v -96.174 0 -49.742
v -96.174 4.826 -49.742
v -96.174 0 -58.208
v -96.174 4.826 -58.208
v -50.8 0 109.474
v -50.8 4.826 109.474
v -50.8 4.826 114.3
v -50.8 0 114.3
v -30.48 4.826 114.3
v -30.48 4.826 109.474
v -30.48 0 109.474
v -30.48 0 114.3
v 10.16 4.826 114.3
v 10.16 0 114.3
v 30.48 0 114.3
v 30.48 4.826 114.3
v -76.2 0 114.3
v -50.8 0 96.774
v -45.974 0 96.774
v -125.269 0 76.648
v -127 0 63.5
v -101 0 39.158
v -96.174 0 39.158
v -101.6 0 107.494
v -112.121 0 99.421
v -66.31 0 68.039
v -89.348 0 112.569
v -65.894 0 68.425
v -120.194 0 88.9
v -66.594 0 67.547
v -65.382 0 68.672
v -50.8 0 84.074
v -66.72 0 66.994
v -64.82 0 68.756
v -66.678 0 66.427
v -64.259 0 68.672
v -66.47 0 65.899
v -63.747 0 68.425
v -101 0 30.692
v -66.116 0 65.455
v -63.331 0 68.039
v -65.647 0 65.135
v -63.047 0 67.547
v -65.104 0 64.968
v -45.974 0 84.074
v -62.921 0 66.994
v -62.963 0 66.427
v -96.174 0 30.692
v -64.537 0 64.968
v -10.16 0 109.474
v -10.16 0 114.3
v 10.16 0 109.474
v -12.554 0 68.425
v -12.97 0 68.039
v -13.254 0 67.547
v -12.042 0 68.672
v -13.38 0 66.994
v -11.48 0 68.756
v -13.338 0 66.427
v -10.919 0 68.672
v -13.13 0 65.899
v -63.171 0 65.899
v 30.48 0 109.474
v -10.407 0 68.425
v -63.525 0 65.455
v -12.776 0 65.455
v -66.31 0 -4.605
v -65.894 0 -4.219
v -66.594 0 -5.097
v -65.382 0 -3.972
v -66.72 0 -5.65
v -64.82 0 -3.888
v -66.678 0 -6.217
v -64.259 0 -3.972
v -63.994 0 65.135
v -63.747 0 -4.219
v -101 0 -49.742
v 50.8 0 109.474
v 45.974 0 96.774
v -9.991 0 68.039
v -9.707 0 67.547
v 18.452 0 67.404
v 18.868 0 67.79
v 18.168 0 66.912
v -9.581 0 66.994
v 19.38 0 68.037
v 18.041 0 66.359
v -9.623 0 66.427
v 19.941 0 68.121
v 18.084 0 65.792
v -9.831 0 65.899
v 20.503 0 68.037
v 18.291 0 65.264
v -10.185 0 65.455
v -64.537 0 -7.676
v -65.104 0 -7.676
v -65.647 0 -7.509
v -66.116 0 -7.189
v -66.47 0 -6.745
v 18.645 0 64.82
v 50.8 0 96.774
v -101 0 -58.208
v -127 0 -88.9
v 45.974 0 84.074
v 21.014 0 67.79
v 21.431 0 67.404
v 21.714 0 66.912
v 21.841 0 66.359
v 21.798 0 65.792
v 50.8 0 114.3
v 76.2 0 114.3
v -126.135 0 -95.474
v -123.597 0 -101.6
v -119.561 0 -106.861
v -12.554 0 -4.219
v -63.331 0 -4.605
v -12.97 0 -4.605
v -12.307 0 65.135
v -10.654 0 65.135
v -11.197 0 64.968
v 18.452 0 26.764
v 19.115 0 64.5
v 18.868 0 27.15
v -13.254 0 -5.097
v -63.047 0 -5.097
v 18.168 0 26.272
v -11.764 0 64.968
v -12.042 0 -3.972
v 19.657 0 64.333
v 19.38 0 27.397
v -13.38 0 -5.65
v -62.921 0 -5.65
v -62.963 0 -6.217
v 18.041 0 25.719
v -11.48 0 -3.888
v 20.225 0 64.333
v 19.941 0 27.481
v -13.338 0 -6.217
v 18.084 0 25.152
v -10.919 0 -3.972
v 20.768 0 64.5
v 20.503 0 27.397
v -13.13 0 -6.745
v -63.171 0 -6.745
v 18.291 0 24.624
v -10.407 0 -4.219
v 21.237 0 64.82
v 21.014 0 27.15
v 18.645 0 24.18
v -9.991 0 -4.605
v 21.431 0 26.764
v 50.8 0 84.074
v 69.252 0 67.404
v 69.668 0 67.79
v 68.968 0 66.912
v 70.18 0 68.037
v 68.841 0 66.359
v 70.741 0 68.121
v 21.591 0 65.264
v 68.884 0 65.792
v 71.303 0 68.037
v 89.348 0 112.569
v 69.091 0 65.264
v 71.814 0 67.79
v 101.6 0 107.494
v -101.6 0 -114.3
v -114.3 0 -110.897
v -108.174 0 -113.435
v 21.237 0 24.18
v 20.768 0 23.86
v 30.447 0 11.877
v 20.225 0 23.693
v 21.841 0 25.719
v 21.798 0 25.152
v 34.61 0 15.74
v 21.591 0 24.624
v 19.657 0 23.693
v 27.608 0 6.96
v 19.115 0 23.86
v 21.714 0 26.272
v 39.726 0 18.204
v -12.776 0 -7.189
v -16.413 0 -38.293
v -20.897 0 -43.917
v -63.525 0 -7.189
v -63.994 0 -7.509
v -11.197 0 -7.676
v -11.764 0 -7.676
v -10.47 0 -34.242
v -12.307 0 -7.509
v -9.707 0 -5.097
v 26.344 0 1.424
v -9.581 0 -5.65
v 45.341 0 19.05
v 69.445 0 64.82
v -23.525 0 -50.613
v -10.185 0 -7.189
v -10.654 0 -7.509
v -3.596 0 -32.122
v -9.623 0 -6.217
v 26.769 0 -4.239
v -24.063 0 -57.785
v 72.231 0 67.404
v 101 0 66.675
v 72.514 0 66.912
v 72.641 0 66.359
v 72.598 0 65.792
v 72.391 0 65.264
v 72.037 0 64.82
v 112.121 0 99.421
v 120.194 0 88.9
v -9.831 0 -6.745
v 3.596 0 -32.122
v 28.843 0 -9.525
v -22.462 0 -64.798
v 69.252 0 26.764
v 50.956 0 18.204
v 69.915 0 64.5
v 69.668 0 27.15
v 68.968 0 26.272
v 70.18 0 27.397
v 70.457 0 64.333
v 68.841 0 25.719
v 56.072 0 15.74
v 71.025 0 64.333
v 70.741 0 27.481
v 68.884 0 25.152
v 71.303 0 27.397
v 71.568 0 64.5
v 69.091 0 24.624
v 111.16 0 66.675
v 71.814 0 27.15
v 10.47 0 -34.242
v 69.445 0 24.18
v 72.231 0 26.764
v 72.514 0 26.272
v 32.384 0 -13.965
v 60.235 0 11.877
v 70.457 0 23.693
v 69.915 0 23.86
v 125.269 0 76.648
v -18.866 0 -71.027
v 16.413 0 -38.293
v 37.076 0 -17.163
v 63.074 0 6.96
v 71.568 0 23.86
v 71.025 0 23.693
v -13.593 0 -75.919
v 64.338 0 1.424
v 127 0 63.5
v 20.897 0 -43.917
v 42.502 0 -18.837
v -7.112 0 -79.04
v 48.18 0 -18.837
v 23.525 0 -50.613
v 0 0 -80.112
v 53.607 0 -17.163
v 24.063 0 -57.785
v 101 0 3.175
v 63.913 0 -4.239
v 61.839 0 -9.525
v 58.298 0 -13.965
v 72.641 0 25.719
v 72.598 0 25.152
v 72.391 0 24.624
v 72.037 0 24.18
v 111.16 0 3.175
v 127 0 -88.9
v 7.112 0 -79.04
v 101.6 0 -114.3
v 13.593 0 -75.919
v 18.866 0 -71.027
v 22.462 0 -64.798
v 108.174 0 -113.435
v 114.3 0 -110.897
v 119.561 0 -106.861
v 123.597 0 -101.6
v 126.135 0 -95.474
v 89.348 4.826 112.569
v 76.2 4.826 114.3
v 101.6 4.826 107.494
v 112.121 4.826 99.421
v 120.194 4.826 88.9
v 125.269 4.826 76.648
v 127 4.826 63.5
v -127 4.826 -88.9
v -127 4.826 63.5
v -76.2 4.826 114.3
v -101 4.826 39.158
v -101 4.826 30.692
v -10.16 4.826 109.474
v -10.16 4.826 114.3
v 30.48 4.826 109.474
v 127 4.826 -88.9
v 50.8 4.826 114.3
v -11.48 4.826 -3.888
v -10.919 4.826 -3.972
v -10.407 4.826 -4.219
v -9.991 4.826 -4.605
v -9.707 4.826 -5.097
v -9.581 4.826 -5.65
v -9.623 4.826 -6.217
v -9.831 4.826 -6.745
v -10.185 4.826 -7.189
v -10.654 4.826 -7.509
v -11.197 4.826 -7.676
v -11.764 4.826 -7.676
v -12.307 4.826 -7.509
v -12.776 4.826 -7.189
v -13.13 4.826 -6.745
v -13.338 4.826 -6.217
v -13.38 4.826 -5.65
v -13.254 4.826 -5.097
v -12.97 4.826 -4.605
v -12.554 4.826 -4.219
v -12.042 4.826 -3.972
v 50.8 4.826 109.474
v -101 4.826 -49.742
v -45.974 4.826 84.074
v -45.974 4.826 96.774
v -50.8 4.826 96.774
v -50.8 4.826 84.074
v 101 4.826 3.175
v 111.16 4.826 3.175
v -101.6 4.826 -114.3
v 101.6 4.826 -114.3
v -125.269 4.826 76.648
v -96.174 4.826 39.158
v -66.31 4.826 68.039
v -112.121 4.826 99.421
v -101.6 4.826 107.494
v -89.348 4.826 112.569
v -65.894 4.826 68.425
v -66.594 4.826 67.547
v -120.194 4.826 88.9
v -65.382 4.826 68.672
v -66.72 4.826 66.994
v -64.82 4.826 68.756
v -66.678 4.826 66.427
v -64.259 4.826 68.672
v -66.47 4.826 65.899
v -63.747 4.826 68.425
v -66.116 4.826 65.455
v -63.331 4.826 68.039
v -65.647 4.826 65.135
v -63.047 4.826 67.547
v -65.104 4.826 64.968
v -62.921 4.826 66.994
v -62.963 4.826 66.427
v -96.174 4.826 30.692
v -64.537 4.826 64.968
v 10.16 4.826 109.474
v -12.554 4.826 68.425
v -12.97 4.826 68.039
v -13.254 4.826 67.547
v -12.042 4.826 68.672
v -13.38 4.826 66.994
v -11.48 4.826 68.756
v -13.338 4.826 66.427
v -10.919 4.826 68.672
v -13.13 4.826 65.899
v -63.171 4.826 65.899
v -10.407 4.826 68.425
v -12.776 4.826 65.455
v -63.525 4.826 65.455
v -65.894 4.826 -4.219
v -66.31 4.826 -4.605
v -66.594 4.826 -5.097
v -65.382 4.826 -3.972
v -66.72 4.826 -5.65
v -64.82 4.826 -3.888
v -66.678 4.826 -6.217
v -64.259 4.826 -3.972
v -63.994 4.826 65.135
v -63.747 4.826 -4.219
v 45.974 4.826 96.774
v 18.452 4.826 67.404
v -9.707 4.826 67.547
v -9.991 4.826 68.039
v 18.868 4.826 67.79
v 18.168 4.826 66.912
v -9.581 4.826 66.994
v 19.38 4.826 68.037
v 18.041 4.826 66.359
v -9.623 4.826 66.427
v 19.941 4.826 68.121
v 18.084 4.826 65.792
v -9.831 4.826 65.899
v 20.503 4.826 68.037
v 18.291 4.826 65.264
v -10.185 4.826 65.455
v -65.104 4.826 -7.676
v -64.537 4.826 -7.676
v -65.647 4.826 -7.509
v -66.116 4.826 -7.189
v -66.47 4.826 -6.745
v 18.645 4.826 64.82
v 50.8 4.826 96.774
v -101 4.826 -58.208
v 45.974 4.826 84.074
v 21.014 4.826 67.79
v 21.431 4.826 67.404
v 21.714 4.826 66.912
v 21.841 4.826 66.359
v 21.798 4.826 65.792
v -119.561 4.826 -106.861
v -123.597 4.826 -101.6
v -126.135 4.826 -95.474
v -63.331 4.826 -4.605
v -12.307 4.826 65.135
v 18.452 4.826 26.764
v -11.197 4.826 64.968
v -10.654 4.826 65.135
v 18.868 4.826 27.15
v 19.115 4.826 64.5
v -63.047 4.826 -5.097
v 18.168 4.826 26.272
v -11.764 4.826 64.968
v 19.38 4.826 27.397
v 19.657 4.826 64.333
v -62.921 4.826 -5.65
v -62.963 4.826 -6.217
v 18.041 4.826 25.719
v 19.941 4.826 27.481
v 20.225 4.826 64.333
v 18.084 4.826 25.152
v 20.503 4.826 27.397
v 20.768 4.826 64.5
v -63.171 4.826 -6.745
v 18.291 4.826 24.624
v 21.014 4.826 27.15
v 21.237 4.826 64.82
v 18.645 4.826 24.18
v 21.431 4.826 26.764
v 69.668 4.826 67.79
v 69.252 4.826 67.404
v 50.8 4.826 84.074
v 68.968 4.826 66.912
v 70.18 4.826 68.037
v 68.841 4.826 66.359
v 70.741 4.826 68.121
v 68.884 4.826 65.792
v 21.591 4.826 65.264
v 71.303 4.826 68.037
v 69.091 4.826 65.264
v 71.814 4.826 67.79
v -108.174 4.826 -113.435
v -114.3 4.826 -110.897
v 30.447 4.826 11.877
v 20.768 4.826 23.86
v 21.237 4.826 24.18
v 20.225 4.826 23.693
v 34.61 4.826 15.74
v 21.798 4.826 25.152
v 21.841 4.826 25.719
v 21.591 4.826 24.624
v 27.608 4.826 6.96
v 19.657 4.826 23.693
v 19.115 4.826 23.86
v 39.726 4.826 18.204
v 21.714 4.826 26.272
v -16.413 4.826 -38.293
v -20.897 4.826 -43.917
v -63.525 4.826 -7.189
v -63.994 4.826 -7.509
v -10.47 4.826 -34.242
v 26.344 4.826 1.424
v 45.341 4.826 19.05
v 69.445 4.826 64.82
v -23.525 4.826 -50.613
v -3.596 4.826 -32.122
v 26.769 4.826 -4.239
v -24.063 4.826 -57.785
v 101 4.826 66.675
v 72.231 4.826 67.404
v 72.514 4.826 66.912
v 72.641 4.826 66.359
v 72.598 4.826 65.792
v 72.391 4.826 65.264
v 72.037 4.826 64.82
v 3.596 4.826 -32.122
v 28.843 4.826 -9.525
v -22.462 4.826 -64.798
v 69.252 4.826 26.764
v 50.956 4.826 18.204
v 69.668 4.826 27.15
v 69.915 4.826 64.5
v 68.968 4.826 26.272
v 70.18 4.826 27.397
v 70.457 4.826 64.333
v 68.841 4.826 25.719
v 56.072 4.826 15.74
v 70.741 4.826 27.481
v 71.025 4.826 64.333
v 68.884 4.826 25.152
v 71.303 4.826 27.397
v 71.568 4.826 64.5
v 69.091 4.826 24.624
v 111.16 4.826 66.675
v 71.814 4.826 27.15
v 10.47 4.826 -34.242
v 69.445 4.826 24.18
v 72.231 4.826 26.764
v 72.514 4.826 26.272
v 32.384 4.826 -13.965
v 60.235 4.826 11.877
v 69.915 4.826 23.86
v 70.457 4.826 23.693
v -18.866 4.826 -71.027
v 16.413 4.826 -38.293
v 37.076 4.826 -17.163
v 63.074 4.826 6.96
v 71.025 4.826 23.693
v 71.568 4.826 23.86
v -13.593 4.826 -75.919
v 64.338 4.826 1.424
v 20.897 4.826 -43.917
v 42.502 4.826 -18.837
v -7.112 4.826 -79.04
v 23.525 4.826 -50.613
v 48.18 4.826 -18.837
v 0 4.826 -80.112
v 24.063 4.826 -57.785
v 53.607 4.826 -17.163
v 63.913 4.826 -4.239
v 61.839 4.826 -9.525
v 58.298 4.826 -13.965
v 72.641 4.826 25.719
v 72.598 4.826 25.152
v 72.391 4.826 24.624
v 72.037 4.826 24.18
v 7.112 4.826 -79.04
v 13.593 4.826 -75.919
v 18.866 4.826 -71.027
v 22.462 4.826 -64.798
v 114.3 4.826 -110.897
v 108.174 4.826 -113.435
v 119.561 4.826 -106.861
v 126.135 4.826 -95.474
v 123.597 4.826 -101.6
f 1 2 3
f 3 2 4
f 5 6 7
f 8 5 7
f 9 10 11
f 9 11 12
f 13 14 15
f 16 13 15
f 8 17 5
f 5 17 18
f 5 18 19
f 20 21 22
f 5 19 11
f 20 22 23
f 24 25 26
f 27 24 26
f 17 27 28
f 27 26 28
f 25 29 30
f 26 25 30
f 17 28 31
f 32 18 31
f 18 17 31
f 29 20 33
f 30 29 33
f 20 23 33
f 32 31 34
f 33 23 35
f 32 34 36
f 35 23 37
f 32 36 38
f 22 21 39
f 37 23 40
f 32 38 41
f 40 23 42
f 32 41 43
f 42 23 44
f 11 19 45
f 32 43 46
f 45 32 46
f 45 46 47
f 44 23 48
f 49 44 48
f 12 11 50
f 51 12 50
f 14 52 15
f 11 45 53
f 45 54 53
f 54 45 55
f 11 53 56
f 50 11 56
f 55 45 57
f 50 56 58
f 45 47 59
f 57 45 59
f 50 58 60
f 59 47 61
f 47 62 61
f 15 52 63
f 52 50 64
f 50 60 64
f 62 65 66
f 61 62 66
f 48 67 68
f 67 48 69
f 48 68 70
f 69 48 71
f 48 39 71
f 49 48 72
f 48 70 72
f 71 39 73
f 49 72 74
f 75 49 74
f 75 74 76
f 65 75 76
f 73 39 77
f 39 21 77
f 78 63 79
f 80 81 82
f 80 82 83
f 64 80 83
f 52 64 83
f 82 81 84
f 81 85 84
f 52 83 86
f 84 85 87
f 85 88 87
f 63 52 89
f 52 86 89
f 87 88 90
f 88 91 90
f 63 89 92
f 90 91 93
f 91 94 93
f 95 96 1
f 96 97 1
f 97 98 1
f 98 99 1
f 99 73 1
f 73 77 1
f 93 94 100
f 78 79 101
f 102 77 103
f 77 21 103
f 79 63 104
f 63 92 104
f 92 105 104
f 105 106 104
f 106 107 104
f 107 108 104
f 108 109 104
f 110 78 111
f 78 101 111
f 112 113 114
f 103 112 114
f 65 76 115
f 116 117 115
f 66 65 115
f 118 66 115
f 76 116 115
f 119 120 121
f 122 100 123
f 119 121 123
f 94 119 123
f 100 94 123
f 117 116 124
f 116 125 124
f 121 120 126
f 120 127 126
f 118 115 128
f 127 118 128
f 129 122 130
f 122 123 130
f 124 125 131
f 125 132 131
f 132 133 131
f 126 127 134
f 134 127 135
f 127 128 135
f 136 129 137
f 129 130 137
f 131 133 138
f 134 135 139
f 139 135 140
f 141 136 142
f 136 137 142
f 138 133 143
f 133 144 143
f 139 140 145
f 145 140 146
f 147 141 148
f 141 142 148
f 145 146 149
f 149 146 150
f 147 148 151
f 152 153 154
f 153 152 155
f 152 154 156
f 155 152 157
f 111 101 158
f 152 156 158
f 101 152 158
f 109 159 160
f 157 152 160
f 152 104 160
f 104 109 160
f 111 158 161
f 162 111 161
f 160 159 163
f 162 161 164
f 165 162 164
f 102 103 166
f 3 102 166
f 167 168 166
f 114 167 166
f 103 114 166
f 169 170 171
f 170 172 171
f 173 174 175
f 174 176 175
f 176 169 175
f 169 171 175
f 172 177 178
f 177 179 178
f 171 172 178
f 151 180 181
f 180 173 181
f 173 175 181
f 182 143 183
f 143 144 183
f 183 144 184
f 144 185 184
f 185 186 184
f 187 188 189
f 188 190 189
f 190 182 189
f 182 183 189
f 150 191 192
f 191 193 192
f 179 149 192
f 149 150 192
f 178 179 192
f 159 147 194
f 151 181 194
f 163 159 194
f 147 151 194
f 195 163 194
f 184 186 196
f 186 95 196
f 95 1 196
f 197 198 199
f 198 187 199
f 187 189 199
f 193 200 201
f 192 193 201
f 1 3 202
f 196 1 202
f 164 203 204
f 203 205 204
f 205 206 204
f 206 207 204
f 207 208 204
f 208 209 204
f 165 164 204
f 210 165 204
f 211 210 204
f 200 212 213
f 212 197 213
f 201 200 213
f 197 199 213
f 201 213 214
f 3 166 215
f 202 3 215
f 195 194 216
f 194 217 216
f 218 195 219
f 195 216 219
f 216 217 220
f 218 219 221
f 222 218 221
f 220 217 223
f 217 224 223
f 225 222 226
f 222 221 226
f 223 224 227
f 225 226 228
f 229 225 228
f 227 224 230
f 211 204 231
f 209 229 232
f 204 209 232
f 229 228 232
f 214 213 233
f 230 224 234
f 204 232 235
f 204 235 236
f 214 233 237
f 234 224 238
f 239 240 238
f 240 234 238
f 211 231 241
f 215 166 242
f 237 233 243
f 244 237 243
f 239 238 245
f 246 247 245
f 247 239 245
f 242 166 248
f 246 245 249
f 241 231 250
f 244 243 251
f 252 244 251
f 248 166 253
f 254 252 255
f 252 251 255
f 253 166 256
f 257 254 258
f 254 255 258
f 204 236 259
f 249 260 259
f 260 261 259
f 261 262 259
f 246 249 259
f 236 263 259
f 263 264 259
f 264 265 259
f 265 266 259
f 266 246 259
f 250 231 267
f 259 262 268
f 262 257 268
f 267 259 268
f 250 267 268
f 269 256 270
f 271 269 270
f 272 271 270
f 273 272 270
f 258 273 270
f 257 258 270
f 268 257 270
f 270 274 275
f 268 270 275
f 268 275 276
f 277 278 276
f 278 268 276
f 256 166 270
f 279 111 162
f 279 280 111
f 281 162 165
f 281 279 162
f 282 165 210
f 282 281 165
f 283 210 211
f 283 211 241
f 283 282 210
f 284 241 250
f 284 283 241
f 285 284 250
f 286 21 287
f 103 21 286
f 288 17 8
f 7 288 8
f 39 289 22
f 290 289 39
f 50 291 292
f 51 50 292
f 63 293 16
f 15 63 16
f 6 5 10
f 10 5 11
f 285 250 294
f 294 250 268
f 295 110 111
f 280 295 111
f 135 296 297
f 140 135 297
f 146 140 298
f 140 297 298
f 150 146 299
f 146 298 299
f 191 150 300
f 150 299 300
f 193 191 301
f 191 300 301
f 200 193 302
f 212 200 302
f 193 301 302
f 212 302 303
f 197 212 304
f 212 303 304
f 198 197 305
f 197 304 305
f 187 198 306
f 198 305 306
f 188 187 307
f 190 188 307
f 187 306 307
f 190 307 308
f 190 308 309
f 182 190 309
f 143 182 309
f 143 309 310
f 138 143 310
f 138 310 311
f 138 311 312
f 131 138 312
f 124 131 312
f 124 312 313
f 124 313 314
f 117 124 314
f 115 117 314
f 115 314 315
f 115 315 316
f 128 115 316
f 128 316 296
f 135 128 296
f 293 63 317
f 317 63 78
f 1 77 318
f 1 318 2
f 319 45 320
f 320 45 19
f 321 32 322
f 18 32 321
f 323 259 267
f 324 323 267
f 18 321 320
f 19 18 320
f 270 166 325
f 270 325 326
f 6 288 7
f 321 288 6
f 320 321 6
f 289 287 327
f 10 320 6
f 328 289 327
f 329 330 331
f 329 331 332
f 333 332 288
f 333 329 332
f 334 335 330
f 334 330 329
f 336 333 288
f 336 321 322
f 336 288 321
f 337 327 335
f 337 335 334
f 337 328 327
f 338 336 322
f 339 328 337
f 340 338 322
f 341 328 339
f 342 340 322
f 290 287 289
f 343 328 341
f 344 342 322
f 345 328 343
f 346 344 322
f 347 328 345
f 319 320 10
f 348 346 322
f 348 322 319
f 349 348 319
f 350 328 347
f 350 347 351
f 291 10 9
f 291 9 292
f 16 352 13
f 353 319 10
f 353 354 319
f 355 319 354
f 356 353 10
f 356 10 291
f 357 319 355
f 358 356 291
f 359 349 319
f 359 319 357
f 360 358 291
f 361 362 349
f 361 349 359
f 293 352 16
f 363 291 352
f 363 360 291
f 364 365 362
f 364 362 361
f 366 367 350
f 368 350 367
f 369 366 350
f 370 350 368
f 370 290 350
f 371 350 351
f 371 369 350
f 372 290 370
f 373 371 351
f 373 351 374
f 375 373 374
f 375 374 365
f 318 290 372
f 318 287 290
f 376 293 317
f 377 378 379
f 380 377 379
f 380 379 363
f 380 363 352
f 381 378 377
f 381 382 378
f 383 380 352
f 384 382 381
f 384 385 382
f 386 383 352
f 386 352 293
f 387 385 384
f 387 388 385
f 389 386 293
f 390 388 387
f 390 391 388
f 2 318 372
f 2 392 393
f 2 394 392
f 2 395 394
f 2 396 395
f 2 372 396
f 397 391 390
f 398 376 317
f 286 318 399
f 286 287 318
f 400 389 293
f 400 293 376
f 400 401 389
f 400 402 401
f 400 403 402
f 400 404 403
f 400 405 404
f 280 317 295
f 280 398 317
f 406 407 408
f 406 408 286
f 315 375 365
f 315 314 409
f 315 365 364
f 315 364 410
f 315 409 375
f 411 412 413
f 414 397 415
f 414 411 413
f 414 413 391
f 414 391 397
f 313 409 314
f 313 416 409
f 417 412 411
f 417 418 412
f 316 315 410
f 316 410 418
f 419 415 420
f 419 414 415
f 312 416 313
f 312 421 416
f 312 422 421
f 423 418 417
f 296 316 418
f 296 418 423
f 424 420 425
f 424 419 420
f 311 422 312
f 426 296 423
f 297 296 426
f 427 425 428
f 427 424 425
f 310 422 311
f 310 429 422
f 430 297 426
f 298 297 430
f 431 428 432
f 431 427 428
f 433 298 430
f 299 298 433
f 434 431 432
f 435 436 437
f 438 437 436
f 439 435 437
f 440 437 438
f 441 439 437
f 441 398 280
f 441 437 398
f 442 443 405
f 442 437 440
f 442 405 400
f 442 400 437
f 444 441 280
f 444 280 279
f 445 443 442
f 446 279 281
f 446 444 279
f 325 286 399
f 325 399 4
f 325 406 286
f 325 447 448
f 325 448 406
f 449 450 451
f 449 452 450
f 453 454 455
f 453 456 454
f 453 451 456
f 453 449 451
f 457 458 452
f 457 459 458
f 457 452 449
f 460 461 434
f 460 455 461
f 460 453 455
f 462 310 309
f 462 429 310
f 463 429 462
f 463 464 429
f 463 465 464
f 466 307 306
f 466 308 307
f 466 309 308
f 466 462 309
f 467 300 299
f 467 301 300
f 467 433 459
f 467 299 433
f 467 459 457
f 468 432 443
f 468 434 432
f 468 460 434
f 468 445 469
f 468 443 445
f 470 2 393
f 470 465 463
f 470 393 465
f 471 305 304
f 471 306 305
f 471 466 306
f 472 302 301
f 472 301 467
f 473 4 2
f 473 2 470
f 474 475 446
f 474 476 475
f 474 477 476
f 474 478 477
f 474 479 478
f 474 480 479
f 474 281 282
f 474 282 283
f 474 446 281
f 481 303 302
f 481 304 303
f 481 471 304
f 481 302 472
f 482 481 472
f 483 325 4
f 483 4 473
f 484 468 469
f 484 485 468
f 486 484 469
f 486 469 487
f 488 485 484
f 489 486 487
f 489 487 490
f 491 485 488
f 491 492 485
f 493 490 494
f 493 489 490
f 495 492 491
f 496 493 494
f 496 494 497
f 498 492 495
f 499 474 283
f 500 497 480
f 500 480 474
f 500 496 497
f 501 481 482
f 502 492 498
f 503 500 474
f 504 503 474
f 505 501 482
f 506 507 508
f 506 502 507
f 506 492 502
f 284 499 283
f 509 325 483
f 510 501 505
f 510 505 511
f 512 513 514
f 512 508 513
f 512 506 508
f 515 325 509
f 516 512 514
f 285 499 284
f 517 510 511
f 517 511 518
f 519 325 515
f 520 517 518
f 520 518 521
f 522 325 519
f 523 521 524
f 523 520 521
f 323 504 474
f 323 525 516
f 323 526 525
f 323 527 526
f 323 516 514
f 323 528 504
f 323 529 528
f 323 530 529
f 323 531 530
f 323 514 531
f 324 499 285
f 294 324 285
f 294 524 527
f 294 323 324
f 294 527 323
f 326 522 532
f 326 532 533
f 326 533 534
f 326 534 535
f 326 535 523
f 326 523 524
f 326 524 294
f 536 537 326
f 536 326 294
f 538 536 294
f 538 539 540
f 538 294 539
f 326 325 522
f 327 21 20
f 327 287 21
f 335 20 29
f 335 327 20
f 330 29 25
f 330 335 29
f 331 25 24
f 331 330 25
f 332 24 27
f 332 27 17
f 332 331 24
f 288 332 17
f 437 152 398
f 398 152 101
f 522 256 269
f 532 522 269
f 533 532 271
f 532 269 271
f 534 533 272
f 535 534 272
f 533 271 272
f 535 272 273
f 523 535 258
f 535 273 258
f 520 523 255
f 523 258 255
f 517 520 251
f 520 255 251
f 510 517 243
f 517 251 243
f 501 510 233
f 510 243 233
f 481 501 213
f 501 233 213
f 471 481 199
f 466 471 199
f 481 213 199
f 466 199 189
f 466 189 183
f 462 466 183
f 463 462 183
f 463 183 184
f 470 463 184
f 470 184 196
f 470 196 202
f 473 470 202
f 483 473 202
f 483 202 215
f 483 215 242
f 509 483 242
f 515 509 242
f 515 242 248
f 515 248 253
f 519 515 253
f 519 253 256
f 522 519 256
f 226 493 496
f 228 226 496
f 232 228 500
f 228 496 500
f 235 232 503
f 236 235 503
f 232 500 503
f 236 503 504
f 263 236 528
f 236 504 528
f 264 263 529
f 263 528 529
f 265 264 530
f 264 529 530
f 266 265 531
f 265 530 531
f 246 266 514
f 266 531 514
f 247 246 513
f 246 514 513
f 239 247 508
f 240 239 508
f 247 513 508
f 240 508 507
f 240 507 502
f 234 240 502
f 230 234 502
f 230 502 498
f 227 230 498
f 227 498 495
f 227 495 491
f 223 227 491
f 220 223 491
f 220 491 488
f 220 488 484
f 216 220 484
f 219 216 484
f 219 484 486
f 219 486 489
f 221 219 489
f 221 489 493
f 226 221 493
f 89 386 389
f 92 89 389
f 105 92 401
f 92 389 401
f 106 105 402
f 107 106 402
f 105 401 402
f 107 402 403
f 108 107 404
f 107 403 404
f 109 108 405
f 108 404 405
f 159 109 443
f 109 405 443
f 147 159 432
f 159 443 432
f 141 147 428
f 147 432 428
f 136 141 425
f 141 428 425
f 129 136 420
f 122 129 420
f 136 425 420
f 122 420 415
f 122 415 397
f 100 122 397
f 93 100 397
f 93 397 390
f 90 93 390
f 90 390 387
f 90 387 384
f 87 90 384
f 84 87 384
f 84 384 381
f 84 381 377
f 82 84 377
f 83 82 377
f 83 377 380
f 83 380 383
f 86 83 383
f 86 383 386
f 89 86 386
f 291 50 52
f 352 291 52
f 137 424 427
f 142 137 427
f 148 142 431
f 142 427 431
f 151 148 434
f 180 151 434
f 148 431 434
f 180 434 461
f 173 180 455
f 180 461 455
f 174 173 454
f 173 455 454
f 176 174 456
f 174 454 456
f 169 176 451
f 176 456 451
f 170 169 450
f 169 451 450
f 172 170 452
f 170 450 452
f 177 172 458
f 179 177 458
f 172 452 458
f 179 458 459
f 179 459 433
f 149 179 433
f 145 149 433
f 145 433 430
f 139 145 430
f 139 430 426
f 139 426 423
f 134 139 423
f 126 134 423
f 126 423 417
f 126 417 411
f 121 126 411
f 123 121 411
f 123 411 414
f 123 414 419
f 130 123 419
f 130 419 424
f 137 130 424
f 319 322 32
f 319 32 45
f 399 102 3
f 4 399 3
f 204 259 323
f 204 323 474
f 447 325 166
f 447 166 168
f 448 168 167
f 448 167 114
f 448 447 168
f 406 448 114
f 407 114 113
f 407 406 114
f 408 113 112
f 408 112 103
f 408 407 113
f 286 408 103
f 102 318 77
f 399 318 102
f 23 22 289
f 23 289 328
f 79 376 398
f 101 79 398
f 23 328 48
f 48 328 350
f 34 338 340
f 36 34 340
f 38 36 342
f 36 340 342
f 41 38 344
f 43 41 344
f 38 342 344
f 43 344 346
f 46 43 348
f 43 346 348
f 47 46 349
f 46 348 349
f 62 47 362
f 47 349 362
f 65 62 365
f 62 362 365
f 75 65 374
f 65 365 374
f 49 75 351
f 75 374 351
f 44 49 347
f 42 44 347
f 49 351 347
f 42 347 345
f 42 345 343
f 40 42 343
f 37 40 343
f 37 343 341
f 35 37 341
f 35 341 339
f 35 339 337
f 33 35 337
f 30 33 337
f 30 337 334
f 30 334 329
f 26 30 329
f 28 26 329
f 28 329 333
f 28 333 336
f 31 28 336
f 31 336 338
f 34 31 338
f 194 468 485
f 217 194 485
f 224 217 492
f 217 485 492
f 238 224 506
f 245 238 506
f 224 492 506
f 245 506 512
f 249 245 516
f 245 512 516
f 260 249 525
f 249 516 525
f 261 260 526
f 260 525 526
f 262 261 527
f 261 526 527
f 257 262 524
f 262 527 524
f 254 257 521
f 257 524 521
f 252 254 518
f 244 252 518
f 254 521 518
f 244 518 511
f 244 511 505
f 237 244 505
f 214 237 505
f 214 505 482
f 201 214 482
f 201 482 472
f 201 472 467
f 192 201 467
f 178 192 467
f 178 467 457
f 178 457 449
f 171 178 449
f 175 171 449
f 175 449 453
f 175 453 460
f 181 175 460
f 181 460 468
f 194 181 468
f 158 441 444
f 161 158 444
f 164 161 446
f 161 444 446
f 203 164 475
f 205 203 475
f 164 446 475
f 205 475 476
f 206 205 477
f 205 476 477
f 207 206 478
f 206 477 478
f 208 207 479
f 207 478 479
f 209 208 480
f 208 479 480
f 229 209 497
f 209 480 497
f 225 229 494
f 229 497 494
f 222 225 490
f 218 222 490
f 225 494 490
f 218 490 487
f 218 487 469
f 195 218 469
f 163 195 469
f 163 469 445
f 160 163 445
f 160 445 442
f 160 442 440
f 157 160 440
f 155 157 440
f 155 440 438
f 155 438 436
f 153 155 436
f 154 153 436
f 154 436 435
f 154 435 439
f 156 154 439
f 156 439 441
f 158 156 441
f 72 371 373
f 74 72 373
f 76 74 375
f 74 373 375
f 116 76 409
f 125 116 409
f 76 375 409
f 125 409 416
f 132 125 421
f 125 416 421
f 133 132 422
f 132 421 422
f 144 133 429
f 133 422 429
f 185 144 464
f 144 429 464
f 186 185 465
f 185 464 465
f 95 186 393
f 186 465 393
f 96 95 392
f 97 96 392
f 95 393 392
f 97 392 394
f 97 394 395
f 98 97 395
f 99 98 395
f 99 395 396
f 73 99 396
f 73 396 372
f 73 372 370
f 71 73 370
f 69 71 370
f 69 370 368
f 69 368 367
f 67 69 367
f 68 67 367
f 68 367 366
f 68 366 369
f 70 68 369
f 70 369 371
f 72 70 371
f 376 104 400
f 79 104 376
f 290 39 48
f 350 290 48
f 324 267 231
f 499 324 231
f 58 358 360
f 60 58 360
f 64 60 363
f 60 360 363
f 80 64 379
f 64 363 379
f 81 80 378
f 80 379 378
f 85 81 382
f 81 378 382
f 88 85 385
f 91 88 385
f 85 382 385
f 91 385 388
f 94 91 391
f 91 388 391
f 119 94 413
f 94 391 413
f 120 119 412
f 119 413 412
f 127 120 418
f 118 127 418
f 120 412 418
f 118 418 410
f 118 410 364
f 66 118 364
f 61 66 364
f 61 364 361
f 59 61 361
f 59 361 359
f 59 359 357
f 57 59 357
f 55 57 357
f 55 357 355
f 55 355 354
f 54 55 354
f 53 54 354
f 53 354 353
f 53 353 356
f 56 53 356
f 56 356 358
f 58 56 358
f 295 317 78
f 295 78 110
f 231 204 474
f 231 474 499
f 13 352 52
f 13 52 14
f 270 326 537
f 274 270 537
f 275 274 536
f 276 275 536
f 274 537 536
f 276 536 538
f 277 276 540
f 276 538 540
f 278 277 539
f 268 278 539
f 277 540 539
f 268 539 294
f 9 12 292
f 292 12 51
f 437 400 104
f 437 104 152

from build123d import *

# Parameters (mm, degrees)
SKETCH1_W           = 254
SKETCH1_H           = 228.6
BOSS_EXTRUDE1_DEPTH = 4.826
CUT_EXTRUDE3_DEPTH  = 4.826
SKETCH19_W          = 4.826
SKETCH19_H          = 8.466666666
CUT_EXTRUDE16_DEPTH = 171.929167423
FILLET11_R          = 50.8
SKETCH20_W          = 10.16
SKETCH20_H          = 63.5
CUT_EXTRUDE17_DEPTH = 171.929167423
SKETCH23_R          = 1.905
CUT_EXTRUDE18_DEPTH = 171.929167423
SKETCH24_W          = 20.32
SKETCH24_H          = 4.826
CUT_EXTRUDE19_DEPTH = 171.929167423
SKETCH26_R          = 24.13
CUT_EXTRUDE20_DEPTH = 171.929167423
SKETCH27_W          = 4.826
SKETCH27_H          = 12.7
CUT_EXTRUDE21_DEPTH = 171.929167423
SKETCH28_R          = 19.05
CUT_EXTRUDE22_DEPTH = 171.929167423


with BuildPart() as part:
    # Sketch1 → Boss-Extrude1 (new body)
    with BuildSketch(Plane(origin=(0, 0, 0), x_dir=(1, 0, 0), z_dir=(0, 1, 0))):
        Rectangle(SKETCH1_W, SKETCH1_H)
    extrude(amount=BOSS_EXTRUDE1_DEPTH)

    # Sketch4 → Cut-Extrude3 (cut)
    with BuildSketch(Plane(origin=(0, 4.826, 0), x_dir=(1, 0, 0), z_dir=(0, 1, 0))):
        with BuildLine():
            Line((-127, 88.9), (-127, 114.3))
            Line((-127, 114.3), (-101.6, 114.3))
            ThreePointArc((-101.6, 114.3), (-119.560512242, 106.860512242), (-127, 88.9))
        make_face()
        with BuildLine():
            Line((127, 88.9), (127, 114.3))
            Line((127, 114.3), (101.6, 114.3))
            ThreePointArc((101.6, 114.3), (119.560512242, 106.860512242), (127, 88.9))
        make_face()
    extrude(amount=-CUT_EXTRUDE3_DEPTH, mode=Mode.SUBTRACT)

    # Sketch19 → Cut-Extrude16 (cut, through all)
    with BuildSketch(Plane(origin=(0, 4.826, 0), x_dir=(1, 0, 0), z_dir=(0, 1, 0))):
        with Locations((-98.58699993, -34.925)):
            Rectangle(SKETCH19_W, SKETCH19_H)
        with Locations((-98.58699993, 53.975)):
            Rectangle(SKETCH19_W, SKETCH19_H)
    extrude(amount=-CUT_EXTRUDE16_DEPTH, mode=Mode.SUBTRACT)

    # Fillet11
    fillet11_edges = [part.edges().sort_by_distance(p)[0] for p in [
        (127, 2.413, 114.3),
        (-127, 2.413, 114.3),
    ]]
    fillet(fillet11_edges, radius=FILLET11_R)

    # Sketch20 → Cut-Extrude17 (cut, through all)
    with BuildSketch(Plane.XZ):
        with Locations((106.07999993, 34.925)):
            Rectangle(SKETCH20_W, SKETCH20_H)
    extrude(amount=-CUT_EXTRUDE17_DEPTH, mode=Mode.SUBTRACT)

    # Sketch23 → Cut-Extrude18 (cut, through all)
    with BuildSketch(Plane(origin=(0, 4.826, 0), x_dir=(1, 0, 0), z_dir=(0, 1, 0))):
        with Locations(Location((70.741119647, -25.576370111, 0), (0, 0, 270))):
            Circle(SKETCH23_R)
        with Locations(Location((70.741119647, -66.216370111, 0), (0, 0, 270))):
            Circle(SKETCH23_R)
        with Locations(Location((19.941119647, -25.576370111, 0), (0, 0, 270))):
            Circle(SKETCH23_R)
        with Locations(Location((19.941119647, -66.216370111, 0), (0, 0, 270))):
            Circle(SKETCH23_R)
        with Locations(Location((-11.48044922, 5.792629889, 0), (0, 0, 270))):
            Circle(SKETCH23_R)
        with Locations(Location((-64.82044922, 5.792629889, 0), (0, 0, 270))):
            Circle(SKETCH23_R)
        with Locations(Location((-64.82044922, -66.851370111, 0), (0, 0, 270))):
            Circle(SKETCH23_R)
        with Locations(Location((-11.48044922, -66.851370111, 0), (0, 0, 270))):
            Circle(SKETCH23_R)
    extrude(amount=-CUT_EXTRUDE18_DEPTH, mode=Mode.SUBTRACT)

    # Sketch24 → Cut-Extrude19 (cut, through all)
    with BuildSketch(Plane.XZ):
        with Locations((40.64, 111.887)):
            Rectangle(SKETCH24_W, SKETCH24_H)
        with Locations((-40.64, 111.887)):
            Rectangle(SKETCH24_W, SKETCH24_H)
        with Locations((0, 111.887)):
            Rectangle(SKETCH24_W, SKETCH24_H)
    extrude(amount=-CUT_EXTRUDE19_DEPTH, mode=Mode.SUBTRACT)

    # Sketch26 → Cut-Extrude20 (cut, through all)
    with BuildSketch(Plane.XZ):
        with Locations(Location((0, -55.982011538, 0), (0, 0, 270))):
            Circle(SKETCH26_R)
    extrude(amount=-CUT_EXTRUDE20_DEPTH, mode=Mode.SUBTRACT)

    # Sketch27 → Cut-Extrude21 (cut, through all)
    with BuildSketch(Plane.XZ):
        with Locations((-48.387, 90.424)):
            Rectangle(SKETCH27_W, SKETCH27_H)
        with Locations((48.387, 90.424)):
            Rectangle(SKETCH27_W, SKETCH27_H)
    extrude(amount=-CUT_EXTRUDE21_DEPTH, mode=Mode.SUBTRACT)

    # Sketch28 → Cut-Extrude22 (cut, through all)
    with BuildSketch(Plane(origin=(0, 4.826, 0), x_dir=(1, 0, 0), z_dir=(0, 1, 0))):
        with Locations(Location((45.341119647, 0, 0), (0, 0, 270))):
            Circle(SKETCH28_R)
    extrude(amount=-CUT_EXTRUDE22_DEPTH, mode=Mode.SUBTRACT)


solid = part.part
